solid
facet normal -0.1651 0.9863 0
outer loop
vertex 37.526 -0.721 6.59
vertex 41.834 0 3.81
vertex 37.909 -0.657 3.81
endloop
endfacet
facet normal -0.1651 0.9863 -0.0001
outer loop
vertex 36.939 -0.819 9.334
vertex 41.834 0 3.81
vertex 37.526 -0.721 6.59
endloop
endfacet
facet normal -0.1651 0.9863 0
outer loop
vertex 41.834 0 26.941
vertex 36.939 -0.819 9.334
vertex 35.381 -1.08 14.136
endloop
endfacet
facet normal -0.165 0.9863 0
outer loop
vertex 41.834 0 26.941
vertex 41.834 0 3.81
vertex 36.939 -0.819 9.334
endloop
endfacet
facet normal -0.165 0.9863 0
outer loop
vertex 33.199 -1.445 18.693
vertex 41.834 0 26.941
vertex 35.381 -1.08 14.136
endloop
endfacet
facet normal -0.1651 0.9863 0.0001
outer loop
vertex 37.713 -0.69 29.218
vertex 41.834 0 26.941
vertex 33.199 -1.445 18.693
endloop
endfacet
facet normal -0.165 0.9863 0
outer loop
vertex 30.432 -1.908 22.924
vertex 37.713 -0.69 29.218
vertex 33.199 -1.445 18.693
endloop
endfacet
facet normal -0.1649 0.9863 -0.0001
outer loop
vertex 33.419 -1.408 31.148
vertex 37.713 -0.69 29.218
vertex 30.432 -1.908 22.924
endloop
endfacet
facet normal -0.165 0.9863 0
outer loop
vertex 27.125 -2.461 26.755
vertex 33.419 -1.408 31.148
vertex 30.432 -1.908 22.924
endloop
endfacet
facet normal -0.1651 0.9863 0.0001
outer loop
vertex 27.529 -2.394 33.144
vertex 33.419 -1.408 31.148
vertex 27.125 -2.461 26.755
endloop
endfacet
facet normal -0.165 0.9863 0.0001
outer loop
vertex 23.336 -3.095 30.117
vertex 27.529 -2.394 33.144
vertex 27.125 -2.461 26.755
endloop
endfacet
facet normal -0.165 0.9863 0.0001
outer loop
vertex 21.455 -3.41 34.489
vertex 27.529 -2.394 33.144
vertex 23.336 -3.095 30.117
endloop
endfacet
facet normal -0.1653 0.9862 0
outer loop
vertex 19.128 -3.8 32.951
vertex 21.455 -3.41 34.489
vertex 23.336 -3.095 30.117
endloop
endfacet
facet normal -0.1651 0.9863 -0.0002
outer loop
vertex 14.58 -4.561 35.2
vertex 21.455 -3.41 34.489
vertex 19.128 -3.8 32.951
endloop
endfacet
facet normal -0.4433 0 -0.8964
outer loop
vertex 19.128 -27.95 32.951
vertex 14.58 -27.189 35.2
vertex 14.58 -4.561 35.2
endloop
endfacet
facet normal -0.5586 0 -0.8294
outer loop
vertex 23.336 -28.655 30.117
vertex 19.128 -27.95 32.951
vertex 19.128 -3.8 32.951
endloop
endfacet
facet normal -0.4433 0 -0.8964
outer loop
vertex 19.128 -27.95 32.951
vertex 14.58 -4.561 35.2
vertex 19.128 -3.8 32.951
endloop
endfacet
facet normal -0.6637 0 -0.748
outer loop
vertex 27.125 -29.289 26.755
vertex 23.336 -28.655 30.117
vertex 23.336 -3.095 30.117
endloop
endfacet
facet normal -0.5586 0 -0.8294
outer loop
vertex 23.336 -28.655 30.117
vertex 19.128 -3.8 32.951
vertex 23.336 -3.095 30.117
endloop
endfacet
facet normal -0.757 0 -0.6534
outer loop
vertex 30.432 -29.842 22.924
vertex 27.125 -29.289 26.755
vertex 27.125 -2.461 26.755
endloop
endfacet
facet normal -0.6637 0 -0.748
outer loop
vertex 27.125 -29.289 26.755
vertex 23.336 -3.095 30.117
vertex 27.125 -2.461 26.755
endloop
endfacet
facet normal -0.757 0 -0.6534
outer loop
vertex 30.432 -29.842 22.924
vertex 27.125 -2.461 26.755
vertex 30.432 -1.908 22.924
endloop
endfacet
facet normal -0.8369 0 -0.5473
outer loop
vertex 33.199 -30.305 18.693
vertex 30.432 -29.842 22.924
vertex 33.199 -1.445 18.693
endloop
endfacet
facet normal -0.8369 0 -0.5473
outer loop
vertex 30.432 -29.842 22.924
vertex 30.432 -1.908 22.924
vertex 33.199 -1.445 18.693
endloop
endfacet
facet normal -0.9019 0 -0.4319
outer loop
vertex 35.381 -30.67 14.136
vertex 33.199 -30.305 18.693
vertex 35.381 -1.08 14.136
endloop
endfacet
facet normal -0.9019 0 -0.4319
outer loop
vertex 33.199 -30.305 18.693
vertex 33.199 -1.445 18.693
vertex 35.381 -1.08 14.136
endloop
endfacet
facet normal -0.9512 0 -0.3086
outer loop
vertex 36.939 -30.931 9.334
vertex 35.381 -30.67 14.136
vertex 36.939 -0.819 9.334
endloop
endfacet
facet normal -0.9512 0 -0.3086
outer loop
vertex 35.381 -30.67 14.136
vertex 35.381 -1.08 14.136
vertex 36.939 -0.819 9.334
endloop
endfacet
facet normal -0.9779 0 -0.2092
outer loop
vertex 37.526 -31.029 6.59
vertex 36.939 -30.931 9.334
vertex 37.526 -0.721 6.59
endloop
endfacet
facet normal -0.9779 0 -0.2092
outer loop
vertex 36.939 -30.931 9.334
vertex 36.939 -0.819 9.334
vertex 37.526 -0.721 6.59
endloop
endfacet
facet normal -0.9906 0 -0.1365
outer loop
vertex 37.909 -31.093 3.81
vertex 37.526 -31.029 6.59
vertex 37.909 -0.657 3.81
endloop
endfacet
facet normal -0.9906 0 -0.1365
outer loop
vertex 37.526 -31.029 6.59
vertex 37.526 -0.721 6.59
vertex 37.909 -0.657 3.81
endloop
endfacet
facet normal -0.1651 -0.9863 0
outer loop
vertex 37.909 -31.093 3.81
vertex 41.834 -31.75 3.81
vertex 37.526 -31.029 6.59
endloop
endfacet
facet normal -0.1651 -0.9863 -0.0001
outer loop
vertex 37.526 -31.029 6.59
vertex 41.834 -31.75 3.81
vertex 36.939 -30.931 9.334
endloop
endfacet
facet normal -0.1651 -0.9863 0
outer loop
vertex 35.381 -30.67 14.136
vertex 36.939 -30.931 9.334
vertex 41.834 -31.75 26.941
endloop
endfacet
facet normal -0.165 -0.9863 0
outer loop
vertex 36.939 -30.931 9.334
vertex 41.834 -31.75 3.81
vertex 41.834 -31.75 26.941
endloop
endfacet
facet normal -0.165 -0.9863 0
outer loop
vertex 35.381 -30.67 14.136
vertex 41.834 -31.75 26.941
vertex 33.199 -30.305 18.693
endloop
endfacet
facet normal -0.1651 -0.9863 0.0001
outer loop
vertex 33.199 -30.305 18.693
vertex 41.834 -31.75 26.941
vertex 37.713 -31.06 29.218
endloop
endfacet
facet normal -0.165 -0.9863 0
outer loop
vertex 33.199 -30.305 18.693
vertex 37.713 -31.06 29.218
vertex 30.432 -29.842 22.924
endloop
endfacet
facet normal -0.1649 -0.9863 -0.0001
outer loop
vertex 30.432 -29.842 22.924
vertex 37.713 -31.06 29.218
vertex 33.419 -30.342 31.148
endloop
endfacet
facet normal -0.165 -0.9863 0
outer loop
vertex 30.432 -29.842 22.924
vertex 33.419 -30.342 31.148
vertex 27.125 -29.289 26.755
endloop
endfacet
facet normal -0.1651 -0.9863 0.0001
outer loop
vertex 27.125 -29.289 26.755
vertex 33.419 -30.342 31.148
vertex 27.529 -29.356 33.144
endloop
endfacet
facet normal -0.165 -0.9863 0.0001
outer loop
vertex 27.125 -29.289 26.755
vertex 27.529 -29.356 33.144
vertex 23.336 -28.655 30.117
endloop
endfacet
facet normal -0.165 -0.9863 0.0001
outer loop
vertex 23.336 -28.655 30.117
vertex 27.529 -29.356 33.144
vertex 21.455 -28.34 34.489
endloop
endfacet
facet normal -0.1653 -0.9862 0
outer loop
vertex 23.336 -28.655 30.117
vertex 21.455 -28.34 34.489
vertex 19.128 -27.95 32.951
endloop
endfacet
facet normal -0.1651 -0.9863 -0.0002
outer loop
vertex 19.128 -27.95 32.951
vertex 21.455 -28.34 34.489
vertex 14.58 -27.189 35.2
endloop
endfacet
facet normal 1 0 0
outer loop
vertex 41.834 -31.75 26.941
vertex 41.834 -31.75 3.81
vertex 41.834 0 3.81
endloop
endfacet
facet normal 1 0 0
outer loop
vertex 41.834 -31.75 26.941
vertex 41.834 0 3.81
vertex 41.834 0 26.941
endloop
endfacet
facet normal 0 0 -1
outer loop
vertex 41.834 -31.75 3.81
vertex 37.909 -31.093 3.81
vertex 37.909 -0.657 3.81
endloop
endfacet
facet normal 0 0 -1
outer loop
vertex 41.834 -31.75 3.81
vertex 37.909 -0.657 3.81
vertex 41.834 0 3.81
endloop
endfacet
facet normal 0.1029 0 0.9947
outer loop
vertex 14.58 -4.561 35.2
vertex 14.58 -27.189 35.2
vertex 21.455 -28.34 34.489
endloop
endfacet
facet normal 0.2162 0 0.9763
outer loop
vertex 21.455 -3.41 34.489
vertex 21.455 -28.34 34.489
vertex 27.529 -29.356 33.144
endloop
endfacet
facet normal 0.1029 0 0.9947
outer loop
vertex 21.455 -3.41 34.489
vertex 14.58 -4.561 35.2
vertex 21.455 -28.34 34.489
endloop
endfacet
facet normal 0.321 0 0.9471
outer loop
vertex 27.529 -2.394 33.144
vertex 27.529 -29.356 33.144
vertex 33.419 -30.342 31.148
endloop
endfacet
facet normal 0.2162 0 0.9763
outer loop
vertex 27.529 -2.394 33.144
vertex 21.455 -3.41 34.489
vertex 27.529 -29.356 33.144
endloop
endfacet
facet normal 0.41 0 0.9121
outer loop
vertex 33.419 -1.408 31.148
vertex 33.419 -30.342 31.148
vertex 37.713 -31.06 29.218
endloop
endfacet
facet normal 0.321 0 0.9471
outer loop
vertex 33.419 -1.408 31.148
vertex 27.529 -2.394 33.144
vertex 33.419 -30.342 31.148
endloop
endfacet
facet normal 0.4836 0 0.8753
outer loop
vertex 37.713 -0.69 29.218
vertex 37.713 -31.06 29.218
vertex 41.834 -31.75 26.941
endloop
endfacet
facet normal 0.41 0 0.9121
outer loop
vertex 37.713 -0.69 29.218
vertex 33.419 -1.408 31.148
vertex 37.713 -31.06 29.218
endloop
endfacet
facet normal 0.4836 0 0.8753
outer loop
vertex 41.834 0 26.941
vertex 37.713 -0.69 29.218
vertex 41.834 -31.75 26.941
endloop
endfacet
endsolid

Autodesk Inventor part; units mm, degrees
ref_plane "YZ Plane" through (0, 0, 0) normal (1, 0, 0) x (0, 1, 0)
ref_plane "XZ Plane" through (0, 0, 0) normal (0, 1, 0) x (-1, 0, 0)
ref_plane "XY Plane" through (0, 0, 0) normal (0, 0, 1) x (1, 0, 0)
sketch "Sketch1" plane through (0, 0, 0) normal (0, 1, 0) x (-1, 0, 0)
  circle A0 centre (0, 0) radius 38.1
  line L0 (-38.1, 0) -> (-41.8338, 0)
  line L1 (-41.8338, 0) -> (-41.8338, 38.1)
  line L2 (-41.8338, 0) -> (-41.8338, -38.1)
  line L3 (-41.8338, -38.1) -> (0, -38.1)
  line L4 (0, 38.1) -> (-41.8338, 38.1)
  arc A1 (0, 38.1) -> (-38.1, 0) centre (0, 0) ccw
  arc A2 (0, 38.1) -> (-26.9408, 26.9408) centre (0, 0) ccw
  arc A3 (-38.1, 0) -> (0, -38.1) centre (0, 0) ccw
  arc A4 (-26.9408, -26.9408) -> (0, -38.1) centre (0, 0) ccw
  arc A5 (-14.5802, 35.1998) -> (-41.8338, 26.9408) centre (-12.1551, -21.8987) ccw
  arc A6 (-41.8338, -26.9408) -> (-14.5802, -35.1998) centre (-12.1551, 21.8987) ccw
  point P0 (-14.5802, -35.1998)
  dimension "d0" = 76.2
  dimension "d1" = 3.7338
  dimension "d2" = 57.15
  dimension "d3" = 57.15
extrude "Extrusion1" add sketch "Sketch1" against normal blind 31.75 contours A0 L0 L1 A5 | A6 L2 L0 A0
sketch "Sketch2" plane through (0, 0, 0) normal (0, 0, 1) x (1, 0, 0)
  line L0 (41.8338, -31.75) -> (-0.6683, -31.75)
  line L1 (41.8338, 0) -> (-9.3567, 0)
  line L2 (41.8338, 0) -> (-14.1234, -9.364)
  line L3 (41.8338, -31.75) -> (-10.3427, -23.0187)
  line L4 (7.8357, -38.2769) -> (6.8485, 14.5363)
  point P0 (0, 0)
  point P1 (7.1202, 0)
  point P2 (7.2285, -5.7909)
  point P3 (7.6066, -26.0223)
  point P4 (7.7137, -31.75)
  dimension "d6" = 9.5
  dimension "d7" = 9.5
extrude "Extrusion2" cut sketch "Sketch2" against normal mid plane 254
sketch "Sketch3" plane through (41.8338, 0, 26.9408) normal (-0.165, 0.9863, 0) x (0.9863, 0.165, 0)
  line L0 (-41.2601, 26.9408) -> (21.7895, 26.9408)
  line L1 (-41.2601, 30.7508) -> (21.7895, 30.7508)
  line L2 (-41.2601, 23.1308) -> (21.7895, 23.1308)
  line L3 (-30.0472, 14.0735) -> (-34.0912, 44.1278)
  line L4 (7.7274, 20.7829) -> (8.5546, 35.8559)
  line L5 (8.5546, 35.8559) -> (-7.3209, 76.3259)
  line L6 (-7.3209, 76.3259) -> (-43.5366, 68.5033)
  line L7 (-43.5366, 68.5033) -> (-33.4602, 39.4386)
  point P0 (7.8563, 23.1308)
  point P1 (-31.2659, 23.1308)
  dimension "d10" = 3.81
  dimension "d11" = 3.81
extrude "Extrusion3" cut sketch "Sketch3" against normal blind 254
sketch "Sketch4" plane through (0, 0, 0) normal (0, 1, 0) x (-1, 0, 0)
  line L0 (-41.8338, 3.81) -> (-37.909, 3.81) projected
  arc A0 (-14.5802, 35.1998) -> (-37.909, 3.81) centre (0, 0) ccw projected
  arc A1 (-14.5802, 35.1998) -> (-41.8338, 26.9408) centre (-12.1551, -21.8987) ccw projected
  line L1 (-41.8338, 26.9408) -> (-41.8338, 3.81) projected
  arc A2 (-14.5802, 35.1998) -> (-41.8338, 26.9408) centre (-12.1551, -21.8987) ccw projected
  line L2 (-14.5802, 35.1998) -> (-16.2152, 20.7478)
  dimension "d14" = 27.2536
  dimension "d15" = 31.3898
sketch "Sketch5" plane through (41.8338, -31.75, 26.9408) normal (1, 0, 0) x (0, 0, -1)
  line L0 (23.1308, 0) -> (0, 0) projected
  line L1 (0, 31.75) -> (23.1308, 31.75) projected
  point P0 (26.9408, 31.75)
  dimension "d16" = 31.75
properties part number "canister holder"
